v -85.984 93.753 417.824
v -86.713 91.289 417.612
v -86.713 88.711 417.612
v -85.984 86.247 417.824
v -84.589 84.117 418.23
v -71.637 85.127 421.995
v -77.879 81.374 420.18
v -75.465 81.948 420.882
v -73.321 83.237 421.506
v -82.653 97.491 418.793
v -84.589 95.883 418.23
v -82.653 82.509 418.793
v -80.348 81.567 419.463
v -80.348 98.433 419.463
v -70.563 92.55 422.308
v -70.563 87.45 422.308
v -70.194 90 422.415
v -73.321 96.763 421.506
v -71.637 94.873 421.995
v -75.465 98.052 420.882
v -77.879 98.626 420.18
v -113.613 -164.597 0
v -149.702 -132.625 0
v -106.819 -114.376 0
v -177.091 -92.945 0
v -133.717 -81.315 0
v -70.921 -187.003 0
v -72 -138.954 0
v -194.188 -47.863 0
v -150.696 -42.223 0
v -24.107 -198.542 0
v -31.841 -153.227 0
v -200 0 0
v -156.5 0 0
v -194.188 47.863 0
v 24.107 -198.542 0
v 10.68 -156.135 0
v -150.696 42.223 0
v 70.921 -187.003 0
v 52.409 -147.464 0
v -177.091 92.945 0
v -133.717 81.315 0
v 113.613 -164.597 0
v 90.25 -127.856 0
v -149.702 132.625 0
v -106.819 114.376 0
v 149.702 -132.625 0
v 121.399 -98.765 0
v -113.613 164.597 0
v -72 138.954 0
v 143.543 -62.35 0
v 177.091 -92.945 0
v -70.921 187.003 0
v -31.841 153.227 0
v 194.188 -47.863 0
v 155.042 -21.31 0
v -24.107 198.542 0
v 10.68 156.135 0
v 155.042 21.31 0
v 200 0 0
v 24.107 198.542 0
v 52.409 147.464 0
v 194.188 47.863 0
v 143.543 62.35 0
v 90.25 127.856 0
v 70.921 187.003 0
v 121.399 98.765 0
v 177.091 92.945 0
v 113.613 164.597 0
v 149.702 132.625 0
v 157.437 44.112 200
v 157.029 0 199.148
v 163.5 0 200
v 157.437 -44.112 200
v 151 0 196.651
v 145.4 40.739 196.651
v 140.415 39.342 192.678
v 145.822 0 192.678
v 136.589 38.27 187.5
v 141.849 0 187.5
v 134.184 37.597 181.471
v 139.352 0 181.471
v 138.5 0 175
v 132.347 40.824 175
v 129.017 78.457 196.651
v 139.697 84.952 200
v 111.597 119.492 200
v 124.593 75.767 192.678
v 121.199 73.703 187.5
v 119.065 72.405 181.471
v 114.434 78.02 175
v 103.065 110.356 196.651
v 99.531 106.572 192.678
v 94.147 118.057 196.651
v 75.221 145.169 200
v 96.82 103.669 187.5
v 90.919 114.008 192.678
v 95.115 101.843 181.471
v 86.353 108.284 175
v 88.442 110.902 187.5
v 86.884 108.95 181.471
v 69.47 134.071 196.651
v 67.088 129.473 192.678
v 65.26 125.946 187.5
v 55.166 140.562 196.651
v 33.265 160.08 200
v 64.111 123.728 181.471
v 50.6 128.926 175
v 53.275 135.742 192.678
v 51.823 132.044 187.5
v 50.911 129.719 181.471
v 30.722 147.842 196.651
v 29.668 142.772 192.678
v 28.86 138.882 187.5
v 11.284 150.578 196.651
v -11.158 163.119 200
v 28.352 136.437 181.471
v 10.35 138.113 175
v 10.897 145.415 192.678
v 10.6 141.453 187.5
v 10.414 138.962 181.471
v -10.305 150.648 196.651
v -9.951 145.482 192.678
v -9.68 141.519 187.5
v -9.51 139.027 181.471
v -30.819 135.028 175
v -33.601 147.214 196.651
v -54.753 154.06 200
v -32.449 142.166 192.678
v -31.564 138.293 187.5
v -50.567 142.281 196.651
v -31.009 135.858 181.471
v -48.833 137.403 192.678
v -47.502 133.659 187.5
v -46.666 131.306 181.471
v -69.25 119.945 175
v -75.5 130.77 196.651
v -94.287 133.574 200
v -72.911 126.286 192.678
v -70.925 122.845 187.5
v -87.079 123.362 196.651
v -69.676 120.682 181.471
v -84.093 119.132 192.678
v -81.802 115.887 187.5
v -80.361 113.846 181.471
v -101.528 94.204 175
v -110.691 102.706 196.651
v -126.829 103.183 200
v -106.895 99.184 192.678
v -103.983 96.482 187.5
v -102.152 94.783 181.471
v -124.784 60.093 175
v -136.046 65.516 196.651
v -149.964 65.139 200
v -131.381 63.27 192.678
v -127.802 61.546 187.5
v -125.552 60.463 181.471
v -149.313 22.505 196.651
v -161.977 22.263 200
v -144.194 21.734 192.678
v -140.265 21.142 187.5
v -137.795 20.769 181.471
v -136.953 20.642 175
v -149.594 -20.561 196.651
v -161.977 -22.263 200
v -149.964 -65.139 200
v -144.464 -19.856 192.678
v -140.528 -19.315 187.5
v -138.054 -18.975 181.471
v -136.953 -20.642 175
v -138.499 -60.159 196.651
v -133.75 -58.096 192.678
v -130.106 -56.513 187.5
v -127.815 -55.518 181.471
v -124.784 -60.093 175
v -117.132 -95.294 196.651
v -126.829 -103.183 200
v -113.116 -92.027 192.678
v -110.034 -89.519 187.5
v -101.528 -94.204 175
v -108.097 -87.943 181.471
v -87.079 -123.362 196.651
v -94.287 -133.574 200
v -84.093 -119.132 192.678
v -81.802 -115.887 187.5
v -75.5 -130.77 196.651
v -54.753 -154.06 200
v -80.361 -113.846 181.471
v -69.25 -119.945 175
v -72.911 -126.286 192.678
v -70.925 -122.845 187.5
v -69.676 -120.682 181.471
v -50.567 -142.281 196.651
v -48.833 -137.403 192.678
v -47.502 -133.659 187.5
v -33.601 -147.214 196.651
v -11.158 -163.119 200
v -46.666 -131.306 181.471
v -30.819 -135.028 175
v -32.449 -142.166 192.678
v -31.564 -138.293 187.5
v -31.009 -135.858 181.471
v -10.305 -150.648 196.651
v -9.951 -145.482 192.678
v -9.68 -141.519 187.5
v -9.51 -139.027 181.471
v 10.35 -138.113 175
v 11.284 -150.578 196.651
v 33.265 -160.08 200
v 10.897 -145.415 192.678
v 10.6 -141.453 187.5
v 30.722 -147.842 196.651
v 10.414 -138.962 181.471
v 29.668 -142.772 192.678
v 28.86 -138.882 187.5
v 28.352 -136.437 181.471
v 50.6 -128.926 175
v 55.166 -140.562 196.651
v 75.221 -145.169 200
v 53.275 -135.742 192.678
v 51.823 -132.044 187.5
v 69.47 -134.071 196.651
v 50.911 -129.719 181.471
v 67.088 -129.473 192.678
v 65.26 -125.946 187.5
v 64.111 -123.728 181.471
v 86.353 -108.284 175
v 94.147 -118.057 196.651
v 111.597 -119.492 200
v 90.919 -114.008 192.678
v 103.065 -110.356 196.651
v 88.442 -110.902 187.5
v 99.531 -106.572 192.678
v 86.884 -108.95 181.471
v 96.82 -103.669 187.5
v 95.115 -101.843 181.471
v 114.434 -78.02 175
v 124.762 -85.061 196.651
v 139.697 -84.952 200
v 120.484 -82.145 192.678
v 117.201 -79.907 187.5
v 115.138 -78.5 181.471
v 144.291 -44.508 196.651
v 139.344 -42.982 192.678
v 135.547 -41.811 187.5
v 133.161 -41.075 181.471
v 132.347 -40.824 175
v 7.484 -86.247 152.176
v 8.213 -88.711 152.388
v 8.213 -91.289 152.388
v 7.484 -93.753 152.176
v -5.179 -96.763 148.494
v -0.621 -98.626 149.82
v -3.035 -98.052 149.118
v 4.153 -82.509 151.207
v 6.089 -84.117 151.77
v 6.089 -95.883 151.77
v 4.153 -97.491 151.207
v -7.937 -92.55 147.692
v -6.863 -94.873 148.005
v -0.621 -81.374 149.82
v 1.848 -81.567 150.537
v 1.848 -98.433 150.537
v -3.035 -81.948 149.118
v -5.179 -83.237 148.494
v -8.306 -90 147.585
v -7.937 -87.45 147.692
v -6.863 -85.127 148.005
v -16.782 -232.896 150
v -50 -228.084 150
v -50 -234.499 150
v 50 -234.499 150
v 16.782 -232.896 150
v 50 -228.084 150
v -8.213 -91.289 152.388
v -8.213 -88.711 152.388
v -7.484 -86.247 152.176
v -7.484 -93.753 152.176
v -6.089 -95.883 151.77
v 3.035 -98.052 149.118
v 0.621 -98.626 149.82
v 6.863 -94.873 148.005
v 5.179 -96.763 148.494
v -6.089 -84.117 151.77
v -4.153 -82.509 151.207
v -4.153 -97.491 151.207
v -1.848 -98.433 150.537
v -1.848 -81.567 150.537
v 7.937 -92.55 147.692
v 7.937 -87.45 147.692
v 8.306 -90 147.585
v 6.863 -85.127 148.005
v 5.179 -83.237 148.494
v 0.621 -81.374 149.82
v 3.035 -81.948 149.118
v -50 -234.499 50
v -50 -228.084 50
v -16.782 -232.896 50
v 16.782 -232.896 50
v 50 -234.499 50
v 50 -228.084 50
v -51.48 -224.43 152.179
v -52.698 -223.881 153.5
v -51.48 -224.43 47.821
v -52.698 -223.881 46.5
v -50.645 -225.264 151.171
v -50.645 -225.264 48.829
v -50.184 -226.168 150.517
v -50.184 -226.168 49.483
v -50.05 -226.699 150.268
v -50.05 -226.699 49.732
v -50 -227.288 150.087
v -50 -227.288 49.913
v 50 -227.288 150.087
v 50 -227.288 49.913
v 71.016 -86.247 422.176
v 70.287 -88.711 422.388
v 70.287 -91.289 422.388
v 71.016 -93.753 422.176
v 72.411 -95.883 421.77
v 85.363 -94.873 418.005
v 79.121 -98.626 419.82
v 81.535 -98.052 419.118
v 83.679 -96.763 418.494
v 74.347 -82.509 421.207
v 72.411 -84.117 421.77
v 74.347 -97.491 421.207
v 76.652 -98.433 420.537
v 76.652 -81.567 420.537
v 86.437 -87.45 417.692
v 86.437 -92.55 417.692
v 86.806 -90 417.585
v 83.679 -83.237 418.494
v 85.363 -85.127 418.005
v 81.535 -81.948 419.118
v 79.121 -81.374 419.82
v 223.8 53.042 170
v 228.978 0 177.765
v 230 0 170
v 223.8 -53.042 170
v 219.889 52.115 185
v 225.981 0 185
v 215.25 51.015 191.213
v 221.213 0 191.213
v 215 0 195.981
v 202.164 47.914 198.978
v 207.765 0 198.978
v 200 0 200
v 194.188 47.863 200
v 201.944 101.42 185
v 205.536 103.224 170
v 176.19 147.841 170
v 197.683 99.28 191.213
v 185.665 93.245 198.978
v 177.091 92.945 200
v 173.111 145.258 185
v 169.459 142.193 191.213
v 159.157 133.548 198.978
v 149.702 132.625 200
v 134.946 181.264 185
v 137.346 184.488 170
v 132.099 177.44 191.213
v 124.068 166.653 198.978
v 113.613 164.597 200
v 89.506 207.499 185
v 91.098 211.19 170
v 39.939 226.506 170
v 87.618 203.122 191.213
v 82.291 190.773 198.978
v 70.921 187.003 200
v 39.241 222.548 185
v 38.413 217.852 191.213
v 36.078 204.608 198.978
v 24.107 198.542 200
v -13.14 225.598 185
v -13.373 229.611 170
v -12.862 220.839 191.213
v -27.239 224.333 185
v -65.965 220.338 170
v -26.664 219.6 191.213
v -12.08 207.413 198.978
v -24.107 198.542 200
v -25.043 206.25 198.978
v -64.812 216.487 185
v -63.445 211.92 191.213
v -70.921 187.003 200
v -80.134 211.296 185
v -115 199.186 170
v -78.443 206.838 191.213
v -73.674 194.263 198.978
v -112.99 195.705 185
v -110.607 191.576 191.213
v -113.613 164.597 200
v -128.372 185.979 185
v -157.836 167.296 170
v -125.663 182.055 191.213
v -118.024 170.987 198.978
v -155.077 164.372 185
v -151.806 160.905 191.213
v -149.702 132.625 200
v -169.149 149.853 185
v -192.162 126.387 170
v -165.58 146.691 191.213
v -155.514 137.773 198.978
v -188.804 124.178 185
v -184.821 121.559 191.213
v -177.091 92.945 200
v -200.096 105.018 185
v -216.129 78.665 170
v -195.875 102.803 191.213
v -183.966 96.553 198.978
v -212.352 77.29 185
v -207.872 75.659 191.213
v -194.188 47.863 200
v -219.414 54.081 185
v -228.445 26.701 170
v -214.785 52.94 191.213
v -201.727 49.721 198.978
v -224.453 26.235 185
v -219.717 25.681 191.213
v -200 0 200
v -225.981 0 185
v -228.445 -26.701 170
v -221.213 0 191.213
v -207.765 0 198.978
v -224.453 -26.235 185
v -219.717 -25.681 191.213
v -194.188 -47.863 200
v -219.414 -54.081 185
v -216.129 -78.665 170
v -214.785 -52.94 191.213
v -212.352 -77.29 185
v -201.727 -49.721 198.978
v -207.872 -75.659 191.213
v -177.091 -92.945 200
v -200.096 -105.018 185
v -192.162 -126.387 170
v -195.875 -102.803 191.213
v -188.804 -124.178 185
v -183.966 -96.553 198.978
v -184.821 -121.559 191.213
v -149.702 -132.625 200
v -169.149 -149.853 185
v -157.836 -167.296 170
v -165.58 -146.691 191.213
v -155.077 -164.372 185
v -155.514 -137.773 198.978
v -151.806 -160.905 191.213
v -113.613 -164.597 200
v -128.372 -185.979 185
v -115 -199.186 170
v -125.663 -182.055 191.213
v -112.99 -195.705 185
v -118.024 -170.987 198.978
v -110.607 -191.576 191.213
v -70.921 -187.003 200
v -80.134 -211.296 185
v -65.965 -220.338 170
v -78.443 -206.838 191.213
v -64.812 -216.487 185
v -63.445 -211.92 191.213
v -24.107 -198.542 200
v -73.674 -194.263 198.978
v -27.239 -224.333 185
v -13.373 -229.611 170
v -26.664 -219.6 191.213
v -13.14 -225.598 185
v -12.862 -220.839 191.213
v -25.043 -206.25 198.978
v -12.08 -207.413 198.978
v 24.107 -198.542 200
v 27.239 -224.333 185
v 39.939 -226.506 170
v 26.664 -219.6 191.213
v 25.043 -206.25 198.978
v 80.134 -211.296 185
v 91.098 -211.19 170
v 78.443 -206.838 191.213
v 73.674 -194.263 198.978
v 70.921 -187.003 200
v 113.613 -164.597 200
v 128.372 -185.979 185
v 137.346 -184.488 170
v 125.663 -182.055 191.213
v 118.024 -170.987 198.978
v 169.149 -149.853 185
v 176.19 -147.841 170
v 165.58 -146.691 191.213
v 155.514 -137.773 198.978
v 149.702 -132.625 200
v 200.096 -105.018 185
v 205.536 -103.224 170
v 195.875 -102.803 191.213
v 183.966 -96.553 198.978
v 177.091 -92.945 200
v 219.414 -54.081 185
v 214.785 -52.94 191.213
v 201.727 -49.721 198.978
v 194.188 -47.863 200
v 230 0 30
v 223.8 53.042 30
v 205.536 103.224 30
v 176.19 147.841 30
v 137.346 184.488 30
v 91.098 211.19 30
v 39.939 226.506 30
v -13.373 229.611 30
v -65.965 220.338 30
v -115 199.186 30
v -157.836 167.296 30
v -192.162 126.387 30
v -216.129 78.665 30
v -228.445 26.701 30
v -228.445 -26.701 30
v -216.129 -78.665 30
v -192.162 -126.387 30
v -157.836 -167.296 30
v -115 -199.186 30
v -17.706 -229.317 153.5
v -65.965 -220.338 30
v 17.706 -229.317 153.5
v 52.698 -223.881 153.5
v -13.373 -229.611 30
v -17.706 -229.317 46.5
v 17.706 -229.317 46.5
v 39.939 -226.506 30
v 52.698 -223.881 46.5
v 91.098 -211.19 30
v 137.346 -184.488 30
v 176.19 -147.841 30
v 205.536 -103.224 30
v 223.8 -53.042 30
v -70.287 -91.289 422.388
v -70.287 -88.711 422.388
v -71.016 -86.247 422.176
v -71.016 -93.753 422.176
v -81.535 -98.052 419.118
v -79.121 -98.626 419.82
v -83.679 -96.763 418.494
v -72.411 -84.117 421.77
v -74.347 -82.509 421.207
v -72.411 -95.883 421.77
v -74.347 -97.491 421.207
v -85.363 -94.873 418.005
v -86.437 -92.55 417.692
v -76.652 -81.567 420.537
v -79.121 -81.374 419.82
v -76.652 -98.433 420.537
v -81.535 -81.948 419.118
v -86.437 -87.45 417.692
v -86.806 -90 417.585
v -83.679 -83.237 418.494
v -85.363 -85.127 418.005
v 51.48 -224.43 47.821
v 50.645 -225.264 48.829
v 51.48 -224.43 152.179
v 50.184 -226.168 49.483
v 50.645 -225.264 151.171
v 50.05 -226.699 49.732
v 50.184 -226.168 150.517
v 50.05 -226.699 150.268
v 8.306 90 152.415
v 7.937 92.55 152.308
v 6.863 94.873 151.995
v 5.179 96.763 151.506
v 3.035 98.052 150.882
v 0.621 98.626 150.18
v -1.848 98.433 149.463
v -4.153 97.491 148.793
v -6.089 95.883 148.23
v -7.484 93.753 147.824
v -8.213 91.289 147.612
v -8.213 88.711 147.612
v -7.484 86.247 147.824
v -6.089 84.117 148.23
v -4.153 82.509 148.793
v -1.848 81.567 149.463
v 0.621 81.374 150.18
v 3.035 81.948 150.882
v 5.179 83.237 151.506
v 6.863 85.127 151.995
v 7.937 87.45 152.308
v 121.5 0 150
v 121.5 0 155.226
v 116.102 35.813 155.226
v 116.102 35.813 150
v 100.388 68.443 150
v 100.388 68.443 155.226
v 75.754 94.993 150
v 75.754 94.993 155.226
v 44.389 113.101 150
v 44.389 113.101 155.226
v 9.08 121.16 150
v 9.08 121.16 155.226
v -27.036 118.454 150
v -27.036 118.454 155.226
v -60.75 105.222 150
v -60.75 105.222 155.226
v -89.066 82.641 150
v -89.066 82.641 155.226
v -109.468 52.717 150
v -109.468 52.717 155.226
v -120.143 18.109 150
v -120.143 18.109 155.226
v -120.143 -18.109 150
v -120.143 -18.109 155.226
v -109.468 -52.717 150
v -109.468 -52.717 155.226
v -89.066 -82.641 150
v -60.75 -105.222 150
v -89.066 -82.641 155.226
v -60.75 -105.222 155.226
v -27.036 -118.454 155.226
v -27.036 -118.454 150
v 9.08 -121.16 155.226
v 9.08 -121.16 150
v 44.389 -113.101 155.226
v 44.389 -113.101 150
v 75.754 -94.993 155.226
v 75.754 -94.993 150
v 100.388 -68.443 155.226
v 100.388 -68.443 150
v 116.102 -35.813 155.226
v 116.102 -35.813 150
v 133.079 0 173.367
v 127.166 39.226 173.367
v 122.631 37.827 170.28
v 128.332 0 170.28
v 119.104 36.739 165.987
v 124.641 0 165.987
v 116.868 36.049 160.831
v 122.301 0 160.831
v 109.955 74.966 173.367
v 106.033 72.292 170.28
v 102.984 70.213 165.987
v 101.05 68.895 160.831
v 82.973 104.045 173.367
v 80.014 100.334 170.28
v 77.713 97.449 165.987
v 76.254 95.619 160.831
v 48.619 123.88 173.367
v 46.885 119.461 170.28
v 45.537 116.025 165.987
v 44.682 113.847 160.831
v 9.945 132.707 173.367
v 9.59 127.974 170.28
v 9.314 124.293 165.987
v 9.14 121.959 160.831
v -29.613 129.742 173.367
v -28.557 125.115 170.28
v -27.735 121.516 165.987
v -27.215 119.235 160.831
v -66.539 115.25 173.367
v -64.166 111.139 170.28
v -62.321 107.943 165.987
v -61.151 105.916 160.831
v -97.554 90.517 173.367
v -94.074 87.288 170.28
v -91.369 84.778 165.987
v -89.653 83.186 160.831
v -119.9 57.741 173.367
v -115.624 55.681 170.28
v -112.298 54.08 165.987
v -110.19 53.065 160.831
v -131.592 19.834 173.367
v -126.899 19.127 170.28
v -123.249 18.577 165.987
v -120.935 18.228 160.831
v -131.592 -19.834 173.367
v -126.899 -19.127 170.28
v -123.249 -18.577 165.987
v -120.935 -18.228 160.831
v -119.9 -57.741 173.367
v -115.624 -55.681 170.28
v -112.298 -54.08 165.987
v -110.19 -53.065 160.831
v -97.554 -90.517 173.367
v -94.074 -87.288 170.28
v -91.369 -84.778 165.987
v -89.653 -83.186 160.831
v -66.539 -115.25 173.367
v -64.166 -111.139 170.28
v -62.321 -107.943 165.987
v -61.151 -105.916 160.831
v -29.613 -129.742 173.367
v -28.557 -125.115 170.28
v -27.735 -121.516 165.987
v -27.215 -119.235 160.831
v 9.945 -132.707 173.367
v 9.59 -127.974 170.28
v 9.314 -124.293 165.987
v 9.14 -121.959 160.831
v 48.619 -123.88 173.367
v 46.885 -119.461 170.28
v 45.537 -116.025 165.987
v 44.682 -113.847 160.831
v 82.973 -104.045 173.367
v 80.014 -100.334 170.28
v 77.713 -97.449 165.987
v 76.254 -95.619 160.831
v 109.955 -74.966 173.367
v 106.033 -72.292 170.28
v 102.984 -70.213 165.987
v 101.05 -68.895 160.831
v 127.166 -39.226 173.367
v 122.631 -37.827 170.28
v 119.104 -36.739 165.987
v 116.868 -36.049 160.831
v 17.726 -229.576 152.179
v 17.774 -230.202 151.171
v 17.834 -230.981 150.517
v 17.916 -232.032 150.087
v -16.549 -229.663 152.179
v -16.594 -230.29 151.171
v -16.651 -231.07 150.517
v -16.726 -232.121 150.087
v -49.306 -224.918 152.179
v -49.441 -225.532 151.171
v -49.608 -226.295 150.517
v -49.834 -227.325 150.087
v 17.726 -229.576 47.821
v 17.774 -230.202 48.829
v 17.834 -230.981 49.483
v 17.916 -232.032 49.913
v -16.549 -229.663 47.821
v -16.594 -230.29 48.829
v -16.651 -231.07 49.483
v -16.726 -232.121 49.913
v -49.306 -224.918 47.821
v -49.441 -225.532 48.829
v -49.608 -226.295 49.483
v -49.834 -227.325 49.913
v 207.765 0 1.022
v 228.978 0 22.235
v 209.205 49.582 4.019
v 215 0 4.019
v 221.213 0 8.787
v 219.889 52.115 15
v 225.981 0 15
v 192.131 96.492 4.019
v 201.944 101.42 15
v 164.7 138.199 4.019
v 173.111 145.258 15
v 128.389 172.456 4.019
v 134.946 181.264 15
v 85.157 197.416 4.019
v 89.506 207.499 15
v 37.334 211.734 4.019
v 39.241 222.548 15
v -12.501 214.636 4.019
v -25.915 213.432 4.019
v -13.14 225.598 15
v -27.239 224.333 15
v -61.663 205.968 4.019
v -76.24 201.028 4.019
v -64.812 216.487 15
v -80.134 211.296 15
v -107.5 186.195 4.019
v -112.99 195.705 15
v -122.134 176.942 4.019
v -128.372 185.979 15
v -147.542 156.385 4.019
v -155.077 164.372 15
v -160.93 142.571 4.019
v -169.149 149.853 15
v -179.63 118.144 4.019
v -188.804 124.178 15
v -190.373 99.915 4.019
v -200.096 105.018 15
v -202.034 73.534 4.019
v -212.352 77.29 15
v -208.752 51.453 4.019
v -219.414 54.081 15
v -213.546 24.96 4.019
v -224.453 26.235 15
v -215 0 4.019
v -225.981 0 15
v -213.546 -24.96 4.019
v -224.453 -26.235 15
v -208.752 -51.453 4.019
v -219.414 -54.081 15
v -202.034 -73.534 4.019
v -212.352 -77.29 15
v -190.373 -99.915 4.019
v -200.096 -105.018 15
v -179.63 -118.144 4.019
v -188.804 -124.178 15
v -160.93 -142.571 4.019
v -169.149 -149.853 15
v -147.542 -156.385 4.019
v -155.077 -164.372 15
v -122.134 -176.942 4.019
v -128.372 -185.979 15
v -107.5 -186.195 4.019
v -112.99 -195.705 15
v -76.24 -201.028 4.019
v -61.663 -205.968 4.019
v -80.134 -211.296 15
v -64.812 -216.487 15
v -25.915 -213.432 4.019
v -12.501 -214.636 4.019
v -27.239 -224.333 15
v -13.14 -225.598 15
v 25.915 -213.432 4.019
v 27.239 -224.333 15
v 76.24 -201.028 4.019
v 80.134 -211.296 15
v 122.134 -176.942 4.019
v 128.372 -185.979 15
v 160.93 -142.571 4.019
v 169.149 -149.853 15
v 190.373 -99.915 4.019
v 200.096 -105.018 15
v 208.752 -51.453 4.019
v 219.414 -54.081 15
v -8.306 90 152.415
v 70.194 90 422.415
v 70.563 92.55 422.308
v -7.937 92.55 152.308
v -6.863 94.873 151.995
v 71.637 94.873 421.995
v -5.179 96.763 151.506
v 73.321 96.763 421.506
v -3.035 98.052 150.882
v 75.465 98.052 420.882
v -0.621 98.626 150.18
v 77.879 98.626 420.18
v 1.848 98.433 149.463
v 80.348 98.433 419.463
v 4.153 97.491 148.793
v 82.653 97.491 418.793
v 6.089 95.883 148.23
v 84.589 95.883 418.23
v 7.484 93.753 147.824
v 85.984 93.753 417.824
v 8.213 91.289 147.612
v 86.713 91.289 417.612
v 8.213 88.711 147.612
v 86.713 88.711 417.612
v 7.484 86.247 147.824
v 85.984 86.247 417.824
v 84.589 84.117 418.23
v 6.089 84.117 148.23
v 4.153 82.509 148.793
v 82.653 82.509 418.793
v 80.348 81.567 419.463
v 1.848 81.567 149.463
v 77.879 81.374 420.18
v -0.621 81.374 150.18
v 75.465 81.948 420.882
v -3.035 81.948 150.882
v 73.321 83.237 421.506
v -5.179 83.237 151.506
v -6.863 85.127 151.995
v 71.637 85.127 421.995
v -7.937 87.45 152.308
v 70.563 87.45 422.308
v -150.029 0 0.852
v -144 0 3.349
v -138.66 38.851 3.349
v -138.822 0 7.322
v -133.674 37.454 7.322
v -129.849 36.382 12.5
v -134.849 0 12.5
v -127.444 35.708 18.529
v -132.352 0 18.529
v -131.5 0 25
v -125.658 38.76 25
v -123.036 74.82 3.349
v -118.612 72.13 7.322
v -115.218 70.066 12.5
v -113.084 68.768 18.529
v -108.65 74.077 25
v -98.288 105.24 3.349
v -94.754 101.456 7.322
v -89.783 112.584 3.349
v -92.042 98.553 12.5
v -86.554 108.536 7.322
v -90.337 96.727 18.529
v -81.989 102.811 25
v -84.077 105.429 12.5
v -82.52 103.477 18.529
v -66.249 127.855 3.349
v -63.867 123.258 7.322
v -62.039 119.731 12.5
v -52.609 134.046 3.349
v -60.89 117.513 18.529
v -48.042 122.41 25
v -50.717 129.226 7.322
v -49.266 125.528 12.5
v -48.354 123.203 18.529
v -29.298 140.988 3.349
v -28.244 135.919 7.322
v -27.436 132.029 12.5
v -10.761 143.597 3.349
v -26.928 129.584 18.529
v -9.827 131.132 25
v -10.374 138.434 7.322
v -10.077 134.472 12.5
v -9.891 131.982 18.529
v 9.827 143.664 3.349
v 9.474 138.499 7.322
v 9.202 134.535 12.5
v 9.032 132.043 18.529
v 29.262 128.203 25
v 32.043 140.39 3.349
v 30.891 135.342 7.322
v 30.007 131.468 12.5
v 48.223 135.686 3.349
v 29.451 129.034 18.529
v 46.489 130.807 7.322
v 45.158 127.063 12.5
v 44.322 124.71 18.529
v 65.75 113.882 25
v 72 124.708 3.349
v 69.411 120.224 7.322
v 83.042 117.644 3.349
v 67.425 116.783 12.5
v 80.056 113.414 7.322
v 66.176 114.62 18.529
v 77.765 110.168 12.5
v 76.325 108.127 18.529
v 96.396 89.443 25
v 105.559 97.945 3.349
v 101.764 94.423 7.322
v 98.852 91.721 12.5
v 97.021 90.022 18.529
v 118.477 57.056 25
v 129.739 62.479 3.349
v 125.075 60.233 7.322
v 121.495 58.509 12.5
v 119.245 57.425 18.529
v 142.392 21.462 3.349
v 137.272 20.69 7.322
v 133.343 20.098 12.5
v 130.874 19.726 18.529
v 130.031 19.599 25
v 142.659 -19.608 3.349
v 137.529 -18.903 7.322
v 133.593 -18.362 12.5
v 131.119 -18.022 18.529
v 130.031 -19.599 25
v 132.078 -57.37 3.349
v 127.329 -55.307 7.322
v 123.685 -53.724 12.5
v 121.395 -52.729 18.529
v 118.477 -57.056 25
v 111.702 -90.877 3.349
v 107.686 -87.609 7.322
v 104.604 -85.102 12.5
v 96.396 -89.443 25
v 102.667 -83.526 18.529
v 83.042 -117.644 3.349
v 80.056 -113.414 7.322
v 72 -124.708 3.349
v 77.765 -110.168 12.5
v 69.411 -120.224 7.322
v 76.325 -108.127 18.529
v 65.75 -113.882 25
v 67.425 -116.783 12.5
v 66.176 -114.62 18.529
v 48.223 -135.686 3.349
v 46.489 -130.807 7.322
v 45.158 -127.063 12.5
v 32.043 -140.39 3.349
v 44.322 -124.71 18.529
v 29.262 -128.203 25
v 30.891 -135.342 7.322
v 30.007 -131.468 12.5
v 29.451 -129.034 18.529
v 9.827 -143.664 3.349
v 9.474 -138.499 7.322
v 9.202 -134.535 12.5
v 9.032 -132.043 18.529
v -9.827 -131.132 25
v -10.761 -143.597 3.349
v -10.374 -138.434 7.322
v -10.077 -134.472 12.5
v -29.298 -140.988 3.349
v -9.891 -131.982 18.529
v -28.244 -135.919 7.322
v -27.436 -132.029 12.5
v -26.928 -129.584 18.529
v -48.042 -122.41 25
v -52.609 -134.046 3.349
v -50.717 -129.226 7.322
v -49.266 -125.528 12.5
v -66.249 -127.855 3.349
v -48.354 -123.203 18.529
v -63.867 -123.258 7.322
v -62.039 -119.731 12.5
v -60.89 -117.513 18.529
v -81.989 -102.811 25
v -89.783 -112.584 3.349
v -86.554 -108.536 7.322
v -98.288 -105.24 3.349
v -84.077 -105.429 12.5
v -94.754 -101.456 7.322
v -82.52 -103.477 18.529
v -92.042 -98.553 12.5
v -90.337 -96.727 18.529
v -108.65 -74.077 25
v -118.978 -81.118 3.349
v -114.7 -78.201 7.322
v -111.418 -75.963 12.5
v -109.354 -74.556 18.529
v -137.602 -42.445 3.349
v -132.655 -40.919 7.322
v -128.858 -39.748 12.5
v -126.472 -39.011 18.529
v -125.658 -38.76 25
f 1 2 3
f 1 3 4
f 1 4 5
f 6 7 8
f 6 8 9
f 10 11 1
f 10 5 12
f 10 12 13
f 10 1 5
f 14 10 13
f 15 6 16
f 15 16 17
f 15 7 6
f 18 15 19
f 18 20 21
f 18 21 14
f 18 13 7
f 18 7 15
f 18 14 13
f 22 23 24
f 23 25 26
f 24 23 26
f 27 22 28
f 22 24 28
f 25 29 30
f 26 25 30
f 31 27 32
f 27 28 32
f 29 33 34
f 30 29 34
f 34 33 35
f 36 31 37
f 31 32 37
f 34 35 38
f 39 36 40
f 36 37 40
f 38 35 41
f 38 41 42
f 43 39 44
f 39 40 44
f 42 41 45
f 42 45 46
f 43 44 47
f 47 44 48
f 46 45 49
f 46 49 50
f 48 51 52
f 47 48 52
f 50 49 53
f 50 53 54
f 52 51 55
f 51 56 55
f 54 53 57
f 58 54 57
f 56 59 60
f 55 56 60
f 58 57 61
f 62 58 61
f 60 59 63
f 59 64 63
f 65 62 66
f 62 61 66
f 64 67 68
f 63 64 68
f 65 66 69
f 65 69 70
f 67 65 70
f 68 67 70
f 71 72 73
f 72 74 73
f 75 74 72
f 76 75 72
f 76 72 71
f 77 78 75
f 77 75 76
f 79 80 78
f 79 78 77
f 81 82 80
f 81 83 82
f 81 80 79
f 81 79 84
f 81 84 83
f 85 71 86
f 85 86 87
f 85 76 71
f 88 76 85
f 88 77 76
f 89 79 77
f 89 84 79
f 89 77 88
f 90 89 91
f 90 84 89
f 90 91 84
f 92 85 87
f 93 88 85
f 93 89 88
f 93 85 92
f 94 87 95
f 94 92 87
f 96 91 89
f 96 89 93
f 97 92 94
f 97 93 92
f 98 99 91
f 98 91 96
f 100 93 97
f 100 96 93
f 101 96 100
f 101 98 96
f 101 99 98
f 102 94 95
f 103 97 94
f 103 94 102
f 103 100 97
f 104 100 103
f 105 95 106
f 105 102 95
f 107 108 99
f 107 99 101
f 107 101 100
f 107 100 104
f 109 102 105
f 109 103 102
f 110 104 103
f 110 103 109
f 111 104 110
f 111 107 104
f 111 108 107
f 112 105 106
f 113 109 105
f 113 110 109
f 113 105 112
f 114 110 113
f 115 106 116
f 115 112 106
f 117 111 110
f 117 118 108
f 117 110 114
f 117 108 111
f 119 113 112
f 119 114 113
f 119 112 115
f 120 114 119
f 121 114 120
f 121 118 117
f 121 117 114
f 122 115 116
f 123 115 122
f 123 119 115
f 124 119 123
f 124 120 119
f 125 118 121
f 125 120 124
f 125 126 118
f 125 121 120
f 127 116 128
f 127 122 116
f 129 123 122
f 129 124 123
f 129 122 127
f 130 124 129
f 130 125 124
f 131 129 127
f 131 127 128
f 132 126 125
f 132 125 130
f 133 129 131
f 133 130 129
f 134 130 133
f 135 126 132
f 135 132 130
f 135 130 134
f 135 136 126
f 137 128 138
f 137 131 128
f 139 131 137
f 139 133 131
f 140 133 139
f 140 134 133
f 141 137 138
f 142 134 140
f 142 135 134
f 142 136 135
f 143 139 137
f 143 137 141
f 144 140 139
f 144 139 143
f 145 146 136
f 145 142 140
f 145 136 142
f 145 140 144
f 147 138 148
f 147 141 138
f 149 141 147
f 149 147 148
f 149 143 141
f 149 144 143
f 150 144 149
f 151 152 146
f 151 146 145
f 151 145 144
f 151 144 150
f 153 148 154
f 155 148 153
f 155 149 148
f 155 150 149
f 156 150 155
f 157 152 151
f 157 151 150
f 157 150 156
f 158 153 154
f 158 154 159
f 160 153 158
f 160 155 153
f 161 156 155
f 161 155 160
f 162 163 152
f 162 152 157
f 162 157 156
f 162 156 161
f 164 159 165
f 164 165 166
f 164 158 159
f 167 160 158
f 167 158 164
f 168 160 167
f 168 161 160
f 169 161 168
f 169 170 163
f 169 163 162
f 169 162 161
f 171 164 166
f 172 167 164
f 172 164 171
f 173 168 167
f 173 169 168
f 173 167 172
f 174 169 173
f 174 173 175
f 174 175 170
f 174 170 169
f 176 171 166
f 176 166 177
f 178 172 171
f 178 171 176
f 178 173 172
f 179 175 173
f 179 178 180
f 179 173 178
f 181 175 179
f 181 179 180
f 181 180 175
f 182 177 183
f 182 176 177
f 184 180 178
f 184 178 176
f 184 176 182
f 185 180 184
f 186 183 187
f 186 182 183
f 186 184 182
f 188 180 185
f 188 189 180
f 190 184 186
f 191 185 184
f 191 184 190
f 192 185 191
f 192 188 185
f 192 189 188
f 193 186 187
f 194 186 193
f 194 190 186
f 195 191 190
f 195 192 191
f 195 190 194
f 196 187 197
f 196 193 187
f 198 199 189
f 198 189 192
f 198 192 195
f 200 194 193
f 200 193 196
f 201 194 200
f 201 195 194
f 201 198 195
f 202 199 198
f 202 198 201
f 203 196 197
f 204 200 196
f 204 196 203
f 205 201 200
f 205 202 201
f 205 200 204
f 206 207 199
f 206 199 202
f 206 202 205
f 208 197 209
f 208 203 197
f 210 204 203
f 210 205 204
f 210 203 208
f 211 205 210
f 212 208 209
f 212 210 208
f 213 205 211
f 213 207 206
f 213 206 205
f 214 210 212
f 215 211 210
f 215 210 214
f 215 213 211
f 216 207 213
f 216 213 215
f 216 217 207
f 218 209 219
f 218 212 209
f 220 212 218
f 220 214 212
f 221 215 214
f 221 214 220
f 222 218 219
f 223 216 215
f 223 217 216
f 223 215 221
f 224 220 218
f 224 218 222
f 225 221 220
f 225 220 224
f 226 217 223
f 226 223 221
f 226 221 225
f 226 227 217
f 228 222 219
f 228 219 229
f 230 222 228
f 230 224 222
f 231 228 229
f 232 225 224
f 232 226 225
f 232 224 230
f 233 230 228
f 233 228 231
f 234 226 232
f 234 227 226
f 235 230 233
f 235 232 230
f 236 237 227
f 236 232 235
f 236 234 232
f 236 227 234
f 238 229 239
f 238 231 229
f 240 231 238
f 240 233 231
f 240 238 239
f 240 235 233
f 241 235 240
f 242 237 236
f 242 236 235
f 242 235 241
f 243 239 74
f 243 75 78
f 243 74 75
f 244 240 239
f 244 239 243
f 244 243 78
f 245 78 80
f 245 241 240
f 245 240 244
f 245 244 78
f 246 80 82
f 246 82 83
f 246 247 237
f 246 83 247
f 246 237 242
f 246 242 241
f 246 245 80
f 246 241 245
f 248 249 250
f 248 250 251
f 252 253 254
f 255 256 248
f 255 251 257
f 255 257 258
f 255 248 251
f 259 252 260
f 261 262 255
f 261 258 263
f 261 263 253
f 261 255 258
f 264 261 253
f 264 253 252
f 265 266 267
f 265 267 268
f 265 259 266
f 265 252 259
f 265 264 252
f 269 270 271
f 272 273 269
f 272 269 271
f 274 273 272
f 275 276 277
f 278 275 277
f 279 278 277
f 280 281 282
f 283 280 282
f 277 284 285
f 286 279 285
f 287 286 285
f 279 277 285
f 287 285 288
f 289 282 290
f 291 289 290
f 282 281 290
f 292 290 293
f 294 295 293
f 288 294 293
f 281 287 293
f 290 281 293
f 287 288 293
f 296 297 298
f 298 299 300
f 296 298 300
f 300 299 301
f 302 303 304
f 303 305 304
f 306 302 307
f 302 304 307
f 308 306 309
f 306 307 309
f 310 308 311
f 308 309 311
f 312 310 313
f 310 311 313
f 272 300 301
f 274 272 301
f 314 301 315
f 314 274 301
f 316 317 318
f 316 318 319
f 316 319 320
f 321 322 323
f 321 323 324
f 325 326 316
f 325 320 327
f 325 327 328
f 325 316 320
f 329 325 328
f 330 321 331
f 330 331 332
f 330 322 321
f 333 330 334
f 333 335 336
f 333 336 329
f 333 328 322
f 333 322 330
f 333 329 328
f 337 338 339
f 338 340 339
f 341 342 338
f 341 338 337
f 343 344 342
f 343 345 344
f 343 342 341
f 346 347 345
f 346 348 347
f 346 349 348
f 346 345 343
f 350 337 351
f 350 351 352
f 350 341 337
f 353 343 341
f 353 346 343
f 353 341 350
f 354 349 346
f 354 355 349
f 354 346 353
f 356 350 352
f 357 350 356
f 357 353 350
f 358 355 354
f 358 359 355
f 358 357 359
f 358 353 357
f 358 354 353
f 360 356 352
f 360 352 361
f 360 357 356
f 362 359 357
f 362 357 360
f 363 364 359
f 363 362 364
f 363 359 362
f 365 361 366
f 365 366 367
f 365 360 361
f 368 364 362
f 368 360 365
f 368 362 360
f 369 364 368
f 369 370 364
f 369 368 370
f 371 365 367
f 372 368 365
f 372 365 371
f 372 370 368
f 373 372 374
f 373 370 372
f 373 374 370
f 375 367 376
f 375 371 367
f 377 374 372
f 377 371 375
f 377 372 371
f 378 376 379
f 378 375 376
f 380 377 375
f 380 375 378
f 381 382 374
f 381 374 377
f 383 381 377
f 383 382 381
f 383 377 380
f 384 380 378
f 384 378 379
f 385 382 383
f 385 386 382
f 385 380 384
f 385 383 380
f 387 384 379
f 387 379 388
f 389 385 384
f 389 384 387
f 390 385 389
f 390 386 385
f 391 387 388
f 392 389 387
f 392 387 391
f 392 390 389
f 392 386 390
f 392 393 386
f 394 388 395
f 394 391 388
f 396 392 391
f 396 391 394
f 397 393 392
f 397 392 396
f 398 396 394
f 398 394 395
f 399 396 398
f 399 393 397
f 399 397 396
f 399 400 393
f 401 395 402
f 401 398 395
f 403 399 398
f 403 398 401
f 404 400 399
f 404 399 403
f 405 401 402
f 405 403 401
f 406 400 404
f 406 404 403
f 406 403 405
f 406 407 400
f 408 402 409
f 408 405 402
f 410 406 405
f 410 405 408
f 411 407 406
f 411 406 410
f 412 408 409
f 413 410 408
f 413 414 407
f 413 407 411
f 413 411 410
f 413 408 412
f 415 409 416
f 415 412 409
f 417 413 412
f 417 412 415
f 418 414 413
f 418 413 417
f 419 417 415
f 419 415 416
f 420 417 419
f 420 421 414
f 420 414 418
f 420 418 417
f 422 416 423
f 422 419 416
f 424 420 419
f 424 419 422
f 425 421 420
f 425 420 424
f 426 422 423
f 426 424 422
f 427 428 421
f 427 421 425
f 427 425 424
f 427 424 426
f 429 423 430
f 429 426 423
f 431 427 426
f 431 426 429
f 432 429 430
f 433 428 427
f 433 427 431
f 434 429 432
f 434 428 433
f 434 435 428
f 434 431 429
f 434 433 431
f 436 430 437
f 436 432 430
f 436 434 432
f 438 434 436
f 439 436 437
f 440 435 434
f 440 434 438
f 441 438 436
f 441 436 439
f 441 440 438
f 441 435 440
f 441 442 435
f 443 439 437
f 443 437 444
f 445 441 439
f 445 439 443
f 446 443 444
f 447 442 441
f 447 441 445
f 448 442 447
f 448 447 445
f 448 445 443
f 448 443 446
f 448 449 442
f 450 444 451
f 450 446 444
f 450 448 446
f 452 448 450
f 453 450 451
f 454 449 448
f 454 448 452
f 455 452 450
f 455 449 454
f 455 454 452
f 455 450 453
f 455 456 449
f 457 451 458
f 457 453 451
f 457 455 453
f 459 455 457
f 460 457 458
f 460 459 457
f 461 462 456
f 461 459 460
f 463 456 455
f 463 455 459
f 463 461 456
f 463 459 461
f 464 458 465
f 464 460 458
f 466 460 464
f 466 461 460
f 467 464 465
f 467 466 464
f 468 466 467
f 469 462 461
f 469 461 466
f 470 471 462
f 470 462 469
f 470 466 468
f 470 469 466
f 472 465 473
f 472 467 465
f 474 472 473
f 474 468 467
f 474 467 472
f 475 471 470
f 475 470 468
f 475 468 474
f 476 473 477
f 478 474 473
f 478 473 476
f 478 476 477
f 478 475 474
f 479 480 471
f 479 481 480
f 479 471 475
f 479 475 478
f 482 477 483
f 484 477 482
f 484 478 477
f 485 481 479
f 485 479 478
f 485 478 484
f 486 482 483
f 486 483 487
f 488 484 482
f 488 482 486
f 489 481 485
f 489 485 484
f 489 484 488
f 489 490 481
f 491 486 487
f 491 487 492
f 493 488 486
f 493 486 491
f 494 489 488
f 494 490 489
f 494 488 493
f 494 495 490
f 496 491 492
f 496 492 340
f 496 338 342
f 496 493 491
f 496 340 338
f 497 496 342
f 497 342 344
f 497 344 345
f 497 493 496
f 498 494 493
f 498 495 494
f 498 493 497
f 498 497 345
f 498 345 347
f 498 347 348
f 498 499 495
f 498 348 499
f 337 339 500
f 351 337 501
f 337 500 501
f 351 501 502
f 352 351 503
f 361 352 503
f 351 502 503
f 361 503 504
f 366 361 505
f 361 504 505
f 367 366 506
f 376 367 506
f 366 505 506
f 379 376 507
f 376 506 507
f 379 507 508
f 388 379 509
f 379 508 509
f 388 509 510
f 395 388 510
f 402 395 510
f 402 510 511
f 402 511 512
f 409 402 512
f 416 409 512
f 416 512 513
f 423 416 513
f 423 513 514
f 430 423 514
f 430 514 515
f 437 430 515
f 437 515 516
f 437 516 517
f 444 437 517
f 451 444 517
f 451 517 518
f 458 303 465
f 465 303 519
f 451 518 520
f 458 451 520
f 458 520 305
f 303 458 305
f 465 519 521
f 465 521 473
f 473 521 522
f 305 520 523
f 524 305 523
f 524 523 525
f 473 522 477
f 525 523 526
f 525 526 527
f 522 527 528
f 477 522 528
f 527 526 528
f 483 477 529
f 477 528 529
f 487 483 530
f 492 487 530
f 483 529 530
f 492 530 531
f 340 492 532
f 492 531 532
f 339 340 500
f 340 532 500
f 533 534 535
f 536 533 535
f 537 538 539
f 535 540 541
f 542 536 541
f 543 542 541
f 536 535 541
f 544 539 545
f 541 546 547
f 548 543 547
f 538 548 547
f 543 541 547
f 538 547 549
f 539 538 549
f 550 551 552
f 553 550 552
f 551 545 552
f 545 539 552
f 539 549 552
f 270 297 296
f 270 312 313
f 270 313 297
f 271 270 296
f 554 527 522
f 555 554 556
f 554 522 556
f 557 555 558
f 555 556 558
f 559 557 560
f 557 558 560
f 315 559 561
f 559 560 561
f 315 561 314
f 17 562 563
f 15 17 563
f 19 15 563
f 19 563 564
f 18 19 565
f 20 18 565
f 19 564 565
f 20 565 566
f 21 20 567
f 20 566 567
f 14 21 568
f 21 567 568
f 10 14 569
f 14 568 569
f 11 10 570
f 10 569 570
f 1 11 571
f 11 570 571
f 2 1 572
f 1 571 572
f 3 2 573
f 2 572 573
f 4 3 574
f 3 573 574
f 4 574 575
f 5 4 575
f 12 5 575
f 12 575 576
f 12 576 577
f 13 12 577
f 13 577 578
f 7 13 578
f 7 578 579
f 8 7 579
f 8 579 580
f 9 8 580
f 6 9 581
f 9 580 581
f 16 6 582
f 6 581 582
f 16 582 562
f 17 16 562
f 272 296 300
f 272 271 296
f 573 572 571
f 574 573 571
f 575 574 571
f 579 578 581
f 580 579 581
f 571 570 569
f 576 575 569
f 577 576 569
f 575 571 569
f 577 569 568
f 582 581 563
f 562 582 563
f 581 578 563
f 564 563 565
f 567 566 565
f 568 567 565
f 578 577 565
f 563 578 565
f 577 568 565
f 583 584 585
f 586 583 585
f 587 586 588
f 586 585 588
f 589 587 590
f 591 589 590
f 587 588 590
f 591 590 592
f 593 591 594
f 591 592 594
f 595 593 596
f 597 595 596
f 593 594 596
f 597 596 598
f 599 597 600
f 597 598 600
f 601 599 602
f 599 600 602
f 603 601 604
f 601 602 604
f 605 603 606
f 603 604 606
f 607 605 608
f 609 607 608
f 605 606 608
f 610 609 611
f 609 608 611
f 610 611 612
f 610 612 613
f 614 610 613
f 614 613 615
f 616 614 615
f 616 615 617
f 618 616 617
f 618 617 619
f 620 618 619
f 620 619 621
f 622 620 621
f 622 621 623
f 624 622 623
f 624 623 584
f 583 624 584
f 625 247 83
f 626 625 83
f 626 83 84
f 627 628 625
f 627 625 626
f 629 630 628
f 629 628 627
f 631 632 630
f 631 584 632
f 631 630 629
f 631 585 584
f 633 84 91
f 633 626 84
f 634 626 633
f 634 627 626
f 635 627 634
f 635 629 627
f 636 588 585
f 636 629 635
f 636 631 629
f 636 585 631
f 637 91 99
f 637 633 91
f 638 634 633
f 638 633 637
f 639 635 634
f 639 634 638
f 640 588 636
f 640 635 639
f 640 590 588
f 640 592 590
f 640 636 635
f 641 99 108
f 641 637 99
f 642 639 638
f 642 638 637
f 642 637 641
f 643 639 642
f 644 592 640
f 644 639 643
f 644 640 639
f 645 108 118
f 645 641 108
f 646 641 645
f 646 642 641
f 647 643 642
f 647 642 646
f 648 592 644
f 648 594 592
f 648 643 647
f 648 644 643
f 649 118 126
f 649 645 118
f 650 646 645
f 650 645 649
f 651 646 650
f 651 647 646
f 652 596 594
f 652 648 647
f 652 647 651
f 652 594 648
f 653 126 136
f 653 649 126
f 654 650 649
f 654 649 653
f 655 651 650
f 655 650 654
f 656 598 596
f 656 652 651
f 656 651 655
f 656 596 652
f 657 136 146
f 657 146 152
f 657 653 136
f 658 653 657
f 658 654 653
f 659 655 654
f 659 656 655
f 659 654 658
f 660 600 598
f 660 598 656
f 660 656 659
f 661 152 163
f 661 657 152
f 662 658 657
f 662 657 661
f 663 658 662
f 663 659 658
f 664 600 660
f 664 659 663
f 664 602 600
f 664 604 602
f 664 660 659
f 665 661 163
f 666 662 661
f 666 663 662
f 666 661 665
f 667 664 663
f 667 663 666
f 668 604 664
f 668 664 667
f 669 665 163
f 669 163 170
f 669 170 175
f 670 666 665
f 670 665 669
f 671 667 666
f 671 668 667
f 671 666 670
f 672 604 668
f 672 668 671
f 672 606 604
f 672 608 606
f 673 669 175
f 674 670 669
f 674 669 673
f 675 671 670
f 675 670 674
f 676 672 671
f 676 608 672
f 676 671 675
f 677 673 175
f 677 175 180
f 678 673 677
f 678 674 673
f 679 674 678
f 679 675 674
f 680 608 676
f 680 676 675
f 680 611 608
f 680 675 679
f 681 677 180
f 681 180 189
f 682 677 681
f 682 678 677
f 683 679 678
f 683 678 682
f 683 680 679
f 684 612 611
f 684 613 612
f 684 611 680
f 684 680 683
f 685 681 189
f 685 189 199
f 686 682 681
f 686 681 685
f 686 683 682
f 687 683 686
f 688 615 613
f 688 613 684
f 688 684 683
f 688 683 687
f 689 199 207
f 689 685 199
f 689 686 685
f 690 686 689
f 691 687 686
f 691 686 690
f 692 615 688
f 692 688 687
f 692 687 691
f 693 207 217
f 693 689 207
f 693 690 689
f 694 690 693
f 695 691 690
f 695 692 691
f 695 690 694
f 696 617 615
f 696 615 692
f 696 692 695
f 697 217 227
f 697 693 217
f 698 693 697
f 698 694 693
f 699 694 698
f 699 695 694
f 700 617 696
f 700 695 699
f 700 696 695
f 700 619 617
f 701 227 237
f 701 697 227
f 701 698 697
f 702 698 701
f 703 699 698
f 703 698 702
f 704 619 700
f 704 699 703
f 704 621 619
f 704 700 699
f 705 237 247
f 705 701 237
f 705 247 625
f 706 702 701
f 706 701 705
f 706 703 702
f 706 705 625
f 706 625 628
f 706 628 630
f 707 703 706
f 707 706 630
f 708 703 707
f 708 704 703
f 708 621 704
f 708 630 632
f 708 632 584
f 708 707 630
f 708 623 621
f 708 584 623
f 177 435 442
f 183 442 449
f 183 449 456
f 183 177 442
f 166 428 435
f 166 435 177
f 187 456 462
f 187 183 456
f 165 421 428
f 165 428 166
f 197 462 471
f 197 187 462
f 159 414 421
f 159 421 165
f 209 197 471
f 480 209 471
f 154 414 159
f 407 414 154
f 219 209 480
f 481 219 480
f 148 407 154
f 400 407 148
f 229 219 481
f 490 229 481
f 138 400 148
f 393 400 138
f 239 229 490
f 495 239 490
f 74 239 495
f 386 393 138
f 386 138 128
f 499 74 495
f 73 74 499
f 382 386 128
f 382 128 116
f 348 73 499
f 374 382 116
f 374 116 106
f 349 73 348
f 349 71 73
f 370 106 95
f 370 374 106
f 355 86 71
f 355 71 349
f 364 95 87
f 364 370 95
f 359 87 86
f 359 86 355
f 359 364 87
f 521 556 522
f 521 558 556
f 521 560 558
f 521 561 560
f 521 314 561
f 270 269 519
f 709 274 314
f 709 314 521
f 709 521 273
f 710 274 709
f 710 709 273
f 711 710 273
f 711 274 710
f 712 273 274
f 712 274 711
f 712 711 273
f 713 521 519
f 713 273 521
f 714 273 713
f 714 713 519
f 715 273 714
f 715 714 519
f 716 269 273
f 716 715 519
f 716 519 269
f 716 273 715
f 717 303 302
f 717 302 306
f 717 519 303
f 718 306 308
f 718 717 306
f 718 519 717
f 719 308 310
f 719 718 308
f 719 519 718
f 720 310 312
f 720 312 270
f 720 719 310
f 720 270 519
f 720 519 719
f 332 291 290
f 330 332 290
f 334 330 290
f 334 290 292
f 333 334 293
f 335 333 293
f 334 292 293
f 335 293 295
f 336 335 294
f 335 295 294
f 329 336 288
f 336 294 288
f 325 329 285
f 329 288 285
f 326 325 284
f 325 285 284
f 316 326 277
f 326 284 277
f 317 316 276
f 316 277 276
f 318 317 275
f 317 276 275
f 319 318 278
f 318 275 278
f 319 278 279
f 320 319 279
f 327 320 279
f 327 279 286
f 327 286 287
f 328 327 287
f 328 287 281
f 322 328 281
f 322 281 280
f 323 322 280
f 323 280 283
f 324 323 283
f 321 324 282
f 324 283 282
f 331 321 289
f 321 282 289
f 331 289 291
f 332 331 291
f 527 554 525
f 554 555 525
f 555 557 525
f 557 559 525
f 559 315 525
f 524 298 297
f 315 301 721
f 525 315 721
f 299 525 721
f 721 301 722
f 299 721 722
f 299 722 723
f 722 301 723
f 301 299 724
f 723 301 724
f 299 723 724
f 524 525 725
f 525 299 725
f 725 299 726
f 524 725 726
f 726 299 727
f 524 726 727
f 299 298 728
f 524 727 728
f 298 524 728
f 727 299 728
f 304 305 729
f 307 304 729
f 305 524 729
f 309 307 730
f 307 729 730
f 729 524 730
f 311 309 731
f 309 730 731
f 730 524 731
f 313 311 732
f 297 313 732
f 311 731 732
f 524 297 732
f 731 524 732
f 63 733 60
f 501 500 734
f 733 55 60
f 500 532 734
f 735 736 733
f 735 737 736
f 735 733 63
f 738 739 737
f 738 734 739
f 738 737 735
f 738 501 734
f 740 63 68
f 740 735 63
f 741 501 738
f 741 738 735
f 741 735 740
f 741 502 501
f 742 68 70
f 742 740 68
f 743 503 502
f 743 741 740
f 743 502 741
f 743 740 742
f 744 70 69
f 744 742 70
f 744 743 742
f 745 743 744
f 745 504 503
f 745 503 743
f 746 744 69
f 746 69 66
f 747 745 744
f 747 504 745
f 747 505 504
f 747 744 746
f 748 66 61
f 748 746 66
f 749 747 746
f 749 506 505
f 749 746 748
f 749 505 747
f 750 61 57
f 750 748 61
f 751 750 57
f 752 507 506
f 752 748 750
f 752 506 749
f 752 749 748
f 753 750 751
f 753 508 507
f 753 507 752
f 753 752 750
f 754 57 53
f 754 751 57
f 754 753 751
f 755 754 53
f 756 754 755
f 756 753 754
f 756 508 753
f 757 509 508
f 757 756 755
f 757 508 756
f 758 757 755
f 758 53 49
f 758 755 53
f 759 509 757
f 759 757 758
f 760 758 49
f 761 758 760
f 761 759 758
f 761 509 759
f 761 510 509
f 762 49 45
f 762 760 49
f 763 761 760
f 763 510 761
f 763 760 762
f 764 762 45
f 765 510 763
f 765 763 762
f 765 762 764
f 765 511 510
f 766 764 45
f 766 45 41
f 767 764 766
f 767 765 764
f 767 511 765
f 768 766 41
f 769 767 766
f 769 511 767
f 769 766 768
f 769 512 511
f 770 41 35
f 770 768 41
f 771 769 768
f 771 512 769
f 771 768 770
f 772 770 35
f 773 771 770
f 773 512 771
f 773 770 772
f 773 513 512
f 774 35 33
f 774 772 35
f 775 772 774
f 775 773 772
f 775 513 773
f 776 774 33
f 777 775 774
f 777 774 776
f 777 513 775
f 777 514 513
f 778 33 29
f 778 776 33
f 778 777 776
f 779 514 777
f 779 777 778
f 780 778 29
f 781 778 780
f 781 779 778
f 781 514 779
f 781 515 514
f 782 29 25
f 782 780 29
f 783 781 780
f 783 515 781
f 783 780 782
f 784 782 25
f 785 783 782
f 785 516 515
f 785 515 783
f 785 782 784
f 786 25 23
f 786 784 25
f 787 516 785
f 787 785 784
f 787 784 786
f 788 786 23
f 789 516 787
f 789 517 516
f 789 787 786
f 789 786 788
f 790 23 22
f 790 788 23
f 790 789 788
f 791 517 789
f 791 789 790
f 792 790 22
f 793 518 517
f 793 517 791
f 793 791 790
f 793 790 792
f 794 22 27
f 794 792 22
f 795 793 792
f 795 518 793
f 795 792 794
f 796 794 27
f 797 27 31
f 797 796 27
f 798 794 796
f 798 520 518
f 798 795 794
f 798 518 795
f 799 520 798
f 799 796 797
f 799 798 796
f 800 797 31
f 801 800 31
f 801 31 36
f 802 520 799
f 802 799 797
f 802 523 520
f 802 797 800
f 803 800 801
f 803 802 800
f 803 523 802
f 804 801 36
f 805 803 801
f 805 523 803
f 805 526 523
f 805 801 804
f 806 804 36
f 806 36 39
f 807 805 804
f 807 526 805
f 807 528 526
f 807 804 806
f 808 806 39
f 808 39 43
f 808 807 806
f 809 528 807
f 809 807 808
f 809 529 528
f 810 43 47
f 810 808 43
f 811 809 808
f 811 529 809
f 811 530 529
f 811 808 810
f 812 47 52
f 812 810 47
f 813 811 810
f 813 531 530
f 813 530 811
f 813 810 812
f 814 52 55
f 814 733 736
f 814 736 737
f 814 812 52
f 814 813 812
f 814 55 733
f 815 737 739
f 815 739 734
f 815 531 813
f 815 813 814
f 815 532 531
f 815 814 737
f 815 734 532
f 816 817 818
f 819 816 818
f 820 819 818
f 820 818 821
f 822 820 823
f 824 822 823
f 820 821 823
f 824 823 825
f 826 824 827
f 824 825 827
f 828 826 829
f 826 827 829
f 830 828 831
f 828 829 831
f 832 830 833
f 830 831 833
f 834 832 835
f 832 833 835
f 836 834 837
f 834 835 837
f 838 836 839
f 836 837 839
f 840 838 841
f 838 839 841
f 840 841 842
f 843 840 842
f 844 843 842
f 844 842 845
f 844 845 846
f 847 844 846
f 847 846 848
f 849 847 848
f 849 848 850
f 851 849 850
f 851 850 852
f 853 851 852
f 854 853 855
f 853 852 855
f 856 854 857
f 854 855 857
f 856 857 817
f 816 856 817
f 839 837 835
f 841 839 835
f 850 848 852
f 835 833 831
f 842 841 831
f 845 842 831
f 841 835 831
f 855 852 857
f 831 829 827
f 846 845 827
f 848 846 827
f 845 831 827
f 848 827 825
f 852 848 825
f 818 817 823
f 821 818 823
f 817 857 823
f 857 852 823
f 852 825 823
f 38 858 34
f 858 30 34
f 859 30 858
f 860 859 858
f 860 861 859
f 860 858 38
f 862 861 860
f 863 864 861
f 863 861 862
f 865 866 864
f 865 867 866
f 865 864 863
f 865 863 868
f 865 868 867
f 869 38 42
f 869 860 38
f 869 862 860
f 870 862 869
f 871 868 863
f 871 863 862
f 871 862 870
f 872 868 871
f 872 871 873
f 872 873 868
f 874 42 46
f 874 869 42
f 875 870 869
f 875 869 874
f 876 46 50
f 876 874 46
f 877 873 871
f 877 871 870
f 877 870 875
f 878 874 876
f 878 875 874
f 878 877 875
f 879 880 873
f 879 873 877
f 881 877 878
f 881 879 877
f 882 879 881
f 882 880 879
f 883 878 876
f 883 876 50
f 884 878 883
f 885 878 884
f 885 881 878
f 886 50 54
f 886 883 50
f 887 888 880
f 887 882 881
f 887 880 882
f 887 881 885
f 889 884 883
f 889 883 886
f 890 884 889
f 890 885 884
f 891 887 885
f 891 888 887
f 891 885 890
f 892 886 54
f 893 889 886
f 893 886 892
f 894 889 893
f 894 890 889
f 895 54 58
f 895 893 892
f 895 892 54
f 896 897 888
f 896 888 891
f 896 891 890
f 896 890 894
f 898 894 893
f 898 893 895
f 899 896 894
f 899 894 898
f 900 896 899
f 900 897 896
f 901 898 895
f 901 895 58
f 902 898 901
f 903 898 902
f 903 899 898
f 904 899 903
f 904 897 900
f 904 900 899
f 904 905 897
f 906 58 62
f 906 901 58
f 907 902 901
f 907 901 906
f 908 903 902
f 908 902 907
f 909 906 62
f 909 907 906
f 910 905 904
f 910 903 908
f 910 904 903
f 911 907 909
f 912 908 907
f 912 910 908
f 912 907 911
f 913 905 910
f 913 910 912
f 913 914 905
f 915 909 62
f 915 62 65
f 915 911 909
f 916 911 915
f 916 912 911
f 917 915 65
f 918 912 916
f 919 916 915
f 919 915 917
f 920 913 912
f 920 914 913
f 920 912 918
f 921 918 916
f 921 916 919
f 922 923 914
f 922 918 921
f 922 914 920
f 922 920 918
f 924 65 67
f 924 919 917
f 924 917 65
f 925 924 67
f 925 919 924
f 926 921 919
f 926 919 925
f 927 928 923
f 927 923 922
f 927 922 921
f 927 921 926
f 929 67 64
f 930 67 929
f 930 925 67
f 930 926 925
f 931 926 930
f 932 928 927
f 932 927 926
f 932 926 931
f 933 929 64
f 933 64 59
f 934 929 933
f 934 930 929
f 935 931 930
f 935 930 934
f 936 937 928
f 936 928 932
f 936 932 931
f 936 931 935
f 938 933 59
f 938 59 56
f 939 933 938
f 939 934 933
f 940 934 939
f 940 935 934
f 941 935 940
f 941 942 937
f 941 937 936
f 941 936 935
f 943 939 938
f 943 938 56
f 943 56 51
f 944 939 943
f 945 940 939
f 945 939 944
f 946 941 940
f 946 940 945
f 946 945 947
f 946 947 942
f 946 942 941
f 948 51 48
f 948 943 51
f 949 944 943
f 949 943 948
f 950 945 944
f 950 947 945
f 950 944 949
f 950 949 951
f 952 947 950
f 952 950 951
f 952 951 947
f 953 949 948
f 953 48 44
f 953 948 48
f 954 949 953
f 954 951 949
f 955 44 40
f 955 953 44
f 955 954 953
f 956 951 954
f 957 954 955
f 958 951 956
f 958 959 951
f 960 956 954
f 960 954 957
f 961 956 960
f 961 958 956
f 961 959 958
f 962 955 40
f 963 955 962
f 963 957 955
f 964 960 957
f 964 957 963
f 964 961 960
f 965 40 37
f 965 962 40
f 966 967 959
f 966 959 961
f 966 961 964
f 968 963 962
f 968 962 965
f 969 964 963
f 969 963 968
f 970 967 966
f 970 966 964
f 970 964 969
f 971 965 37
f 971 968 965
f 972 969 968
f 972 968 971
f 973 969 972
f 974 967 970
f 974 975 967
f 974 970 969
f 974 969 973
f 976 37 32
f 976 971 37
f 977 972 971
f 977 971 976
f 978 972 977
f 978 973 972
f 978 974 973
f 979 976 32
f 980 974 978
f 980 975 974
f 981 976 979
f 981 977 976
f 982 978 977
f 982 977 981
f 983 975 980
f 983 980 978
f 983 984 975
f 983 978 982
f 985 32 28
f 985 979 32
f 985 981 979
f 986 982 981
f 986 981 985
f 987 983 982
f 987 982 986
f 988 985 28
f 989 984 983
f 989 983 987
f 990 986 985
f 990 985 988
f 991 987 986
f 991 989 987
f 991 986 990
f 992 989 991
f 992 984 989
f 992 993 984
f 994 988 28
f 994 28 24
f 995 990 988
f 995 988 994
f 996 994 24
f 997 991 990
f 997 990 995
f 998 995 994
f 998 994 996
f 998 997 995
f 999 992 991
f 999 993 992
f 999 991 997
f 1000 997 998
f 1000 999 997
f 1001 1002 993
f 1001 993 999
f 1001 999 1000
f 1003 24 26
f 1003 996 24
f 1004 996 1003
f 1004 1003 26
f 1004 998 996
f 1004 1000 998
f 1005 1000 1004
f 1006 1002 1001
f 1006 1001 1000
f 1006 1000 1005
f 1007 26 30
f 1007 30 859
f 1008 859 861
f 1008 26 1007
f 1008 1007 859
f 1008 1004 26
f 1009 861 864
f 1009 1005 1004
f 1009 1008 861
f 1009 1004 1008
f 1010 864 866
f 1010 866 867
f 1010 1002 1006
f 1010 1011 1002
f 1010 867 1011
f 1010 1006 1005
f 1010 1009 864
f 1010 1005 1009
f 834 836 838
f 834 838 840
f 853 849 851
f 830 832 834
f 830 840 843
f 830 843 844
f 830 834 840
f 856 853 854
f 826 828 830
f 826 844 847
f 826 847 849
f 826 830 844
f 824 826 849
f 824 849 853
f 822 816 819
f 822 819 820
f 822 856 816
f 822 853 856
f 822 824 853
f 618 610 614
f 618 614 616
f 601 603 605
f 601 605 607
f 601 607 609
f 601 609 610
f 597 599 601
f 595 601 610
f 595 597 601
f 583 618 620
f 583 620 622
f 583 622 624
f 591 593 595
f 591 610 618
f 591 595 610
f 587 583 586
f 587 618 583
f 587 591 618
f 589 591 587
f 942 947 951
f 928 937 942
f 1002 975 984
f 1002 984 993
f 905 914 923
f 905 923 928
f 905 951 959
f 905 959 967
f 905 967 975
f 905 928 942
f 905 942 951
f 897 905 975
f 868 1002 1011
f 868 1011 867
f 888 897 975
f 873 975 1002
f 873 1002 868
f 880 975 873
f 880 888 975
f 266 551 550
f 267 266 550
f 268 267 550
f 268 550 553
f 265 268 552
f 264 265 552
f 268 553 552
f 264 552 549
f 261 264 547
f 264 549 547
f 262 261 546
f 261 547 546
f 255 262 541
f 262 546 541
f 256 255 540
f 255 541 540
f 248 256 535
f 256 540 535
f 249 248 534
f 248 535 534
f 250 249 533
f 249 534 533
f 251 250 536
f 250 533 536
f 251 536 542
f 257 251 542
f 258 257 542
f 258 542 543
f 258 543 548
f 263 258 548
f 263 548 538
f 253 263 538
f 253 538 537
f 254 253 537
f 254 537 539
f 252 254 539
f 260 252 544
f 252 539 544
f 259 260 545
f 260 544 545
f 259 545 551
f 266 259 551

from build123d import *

# Parameters (mm, degrees)
SKETCH_1_R               = 230
EXTRUDE_1_DEPTH          = 200
SKETCH_4_R               = 138.5
CUT_EXTRUDE_1_DEPTH      = 25
SKETCH_5_R               = 121.5
CUT_EXTRUDE_2_DEPTH      = 25
SKETCH_6_R               = 131.5
CUT_EXTRUDE_3_DEPTH      = 25
FILLET_1_R               = 25
FILLET_2_R               = 20
FILLET_3_R               = 30
SKETCH_11_ON_SEGMENT_1_R = 8.65
F_17_3_CIRCLE_1_DEPTH    = 281.180102425
SKETCH_11_R              = 8.65
F_17_3_CIRCLE_1_2_DEPTH  = 281.180102425
SKETCH_12_ON_SEGMENT_1_R = 8.65
F_17_3_CIRCLE_2_DEPTH    = 281.180102425
SKETCH_12_R              = 8.65
F_17_3_CIRCLE_2_2_DEPTH  = 281.180102425
EXTRUDE_2_DEPTH          = 50
FILLET_5_R               = 3.5


# Some blends are built 0.0001 mm under size
with BuildPart() as part:
    # 스케치1 → 보스-돌출1 (new body)
    with BuildSketch(Plane.XY):
        Circle(SKETCH_1_R)
    extrude(amount=EXTRUDE_1_DEPTH)

    # 스케치4 → 컷-돌출1 (cut)
    with BuildSketch(Plane.XY.offset(200)):
        Circle(SKETCH_4_R)
    extrude(amount=-CUT_EXTRUDE_1_DEPTH, mode=Mode.SUBTRACT)

    # 스케치5 → 컷-돌출2 (cut)
    with BuildSketch(Plane.XY.offset(175)):
        Circle(SKETCH_5_R)
    extrude(amount=-CUT_EXTRUDE_2_DEPTH, mode=Mode.SUBTRACT)

    # 스케치6 → 컷-돌출3 (cut)
    with BuildSketch(Plane(origin=(0, 0, 0), x_dir=(-1, 0, 0), z_dir=(0, 0, -1))):
        Circle(SKETCH_6_R)
    extrude(amount=-CUT_EXTRUDE_3_DEPTH, mode=Mode.SUBTRACT)

    # 필렛1
    fillet_1_edges = [part.edges().sort_by_distance(p)[0] for p in [
        (131.5, 0, 0),
        (-138.5, 0, 200),
    ]]
    fillet(fillet_1_edges, radius=FILLET_1_R - 0.0001)  # a hair under: the kernel refuses the full size

    # 필렛2
    # the kernel refuses this fillet: 20 mm, written as the material it takes off along each edge
    with BuildSketch(Plane(origin=(0, 0, 175), x_dir=(1, 0, 0), z_dir=(0, -1, 0))) as fillet_2_piece_1:
        with BuildLine():
            CenterArc((141.5, -19.773719933), FILLET_2_R, 98.626926559, 81.373073441)
            Line((121.5, -19.773719933), (121.1, -19.773719933))
            Line((121.1, -19.773719933), (121.1, 0))
            Line((121.1, 0), (121.5, 0.4))
            ThreePointArc((121.5, 0.4), (130, 0.4), (138.44, 0.395474399))
            Line((138.44, 0.395474399), (138.5, 0))
        make_face()
    revolve(axis=Axis((0, 0, 175), (0, 0, 1)), mode=Mode.SUBTRACT)

    # 필렛3
    fillet_3_edges = [part.edges().sort_by_distance(p)[0] for p in [
        (-230, 0, 0),
        (-230, 0, 200),
    ]]
    fillet(fillet_3_edges, radius=FILLET_3_R)

    # 스케치16 → 보스-돌출2 (add, symmetric)
    with BuildSketch(Plane.XY.offset(100)):
        with BuildLine():
            Line((-50, -234.499443206), (50, -234.499443206))
            Line((50, -234.499443206), (50, -224.499443206))
            ThreePointArc((50, -224.499443206), (0, -230), (-50, -224.499443206))
            Line((-50, -224.499443206), (-50, -234.499443206))
        make_face()
    extrude(amount=EXTRUDE_2_DEPTH, both=True)

    # 필렛5
    fillet_5_edges = [part.edges().sort_by_distance(p)[0] for p in [
        (-50, -224.499443206, 100),
        (0, -230, 50),
        (50, -224.499443206, 100),
        (0, -230, 150),
    ]]
    fillet(fillet_5_edges, radius=FILLET_5_R)


with BuildPart() as body_2:
    # 스케치11 on segment 1 (carried to segment 1) → 종류 17.3_CIRCLE(1) (new body)
    with BuildSketch(Plane(origin=(78.5, 90, 420), x_dir=(-0.960238643, 0, 0.279180494), z_dir=(-0.279180494, 0, -0.960238643))):
        Circle(SKETCH_11_ON_SEGMENT_1_R)
    extrude(amount=F_17_3_CIRCLE_1_DEPTH)


with BuildPart() as body_3:
    # 스케치11 → 17.3_CIRCLE_1 2 (new body)
    with BuildSketch(Plane(origin=(0, 90, 150), x_dir=(0.9602386430297387, 0, 0.27918049436234993), z_dir=(-0.27918049436234993, 0, 0.9602386430297387))):
        Circle(SKETCH_11_R)
    extrude(amount=F_17_3_CIRCLE_1_2_DEPTH)


with BuildPart() as body_4:
    # 스케치12 on segment 1 (carried to segment 1) → 종류 17.3_CIRCLE(2) (new body)
    with BuildSketch(Plane(origin=(-78.5, -90, 420), x_dir=(-0.960238643, 0, -0.279180494), z_dir=(0.279180494, 0, -0.960238643))):
        Circle(SKETCH_12_ON_SEGMENT_1_R)
    extrude(amount=F_17_3_CIRCLE_2_DEPTH)


with BuildPart() as body_5:
    # 스케치12 → 17.3_CIRCLE_2 2 (new body)
    with BuildSketch(Plane(origin=(0, -90, 150), x_dir=(0.9602386430297387, 0, -0.27918049436234993), z_dir=(0.27918049436234993, 0, 0.9602386430297387))):
        Circle(SKETCH_12_R)
    extrude(amount=F_17_3_CIRCLE_2_2_DEPTH)


solid = Compound([part.part, body_2.part, body_3.part, body_4.part, body_5.part])
